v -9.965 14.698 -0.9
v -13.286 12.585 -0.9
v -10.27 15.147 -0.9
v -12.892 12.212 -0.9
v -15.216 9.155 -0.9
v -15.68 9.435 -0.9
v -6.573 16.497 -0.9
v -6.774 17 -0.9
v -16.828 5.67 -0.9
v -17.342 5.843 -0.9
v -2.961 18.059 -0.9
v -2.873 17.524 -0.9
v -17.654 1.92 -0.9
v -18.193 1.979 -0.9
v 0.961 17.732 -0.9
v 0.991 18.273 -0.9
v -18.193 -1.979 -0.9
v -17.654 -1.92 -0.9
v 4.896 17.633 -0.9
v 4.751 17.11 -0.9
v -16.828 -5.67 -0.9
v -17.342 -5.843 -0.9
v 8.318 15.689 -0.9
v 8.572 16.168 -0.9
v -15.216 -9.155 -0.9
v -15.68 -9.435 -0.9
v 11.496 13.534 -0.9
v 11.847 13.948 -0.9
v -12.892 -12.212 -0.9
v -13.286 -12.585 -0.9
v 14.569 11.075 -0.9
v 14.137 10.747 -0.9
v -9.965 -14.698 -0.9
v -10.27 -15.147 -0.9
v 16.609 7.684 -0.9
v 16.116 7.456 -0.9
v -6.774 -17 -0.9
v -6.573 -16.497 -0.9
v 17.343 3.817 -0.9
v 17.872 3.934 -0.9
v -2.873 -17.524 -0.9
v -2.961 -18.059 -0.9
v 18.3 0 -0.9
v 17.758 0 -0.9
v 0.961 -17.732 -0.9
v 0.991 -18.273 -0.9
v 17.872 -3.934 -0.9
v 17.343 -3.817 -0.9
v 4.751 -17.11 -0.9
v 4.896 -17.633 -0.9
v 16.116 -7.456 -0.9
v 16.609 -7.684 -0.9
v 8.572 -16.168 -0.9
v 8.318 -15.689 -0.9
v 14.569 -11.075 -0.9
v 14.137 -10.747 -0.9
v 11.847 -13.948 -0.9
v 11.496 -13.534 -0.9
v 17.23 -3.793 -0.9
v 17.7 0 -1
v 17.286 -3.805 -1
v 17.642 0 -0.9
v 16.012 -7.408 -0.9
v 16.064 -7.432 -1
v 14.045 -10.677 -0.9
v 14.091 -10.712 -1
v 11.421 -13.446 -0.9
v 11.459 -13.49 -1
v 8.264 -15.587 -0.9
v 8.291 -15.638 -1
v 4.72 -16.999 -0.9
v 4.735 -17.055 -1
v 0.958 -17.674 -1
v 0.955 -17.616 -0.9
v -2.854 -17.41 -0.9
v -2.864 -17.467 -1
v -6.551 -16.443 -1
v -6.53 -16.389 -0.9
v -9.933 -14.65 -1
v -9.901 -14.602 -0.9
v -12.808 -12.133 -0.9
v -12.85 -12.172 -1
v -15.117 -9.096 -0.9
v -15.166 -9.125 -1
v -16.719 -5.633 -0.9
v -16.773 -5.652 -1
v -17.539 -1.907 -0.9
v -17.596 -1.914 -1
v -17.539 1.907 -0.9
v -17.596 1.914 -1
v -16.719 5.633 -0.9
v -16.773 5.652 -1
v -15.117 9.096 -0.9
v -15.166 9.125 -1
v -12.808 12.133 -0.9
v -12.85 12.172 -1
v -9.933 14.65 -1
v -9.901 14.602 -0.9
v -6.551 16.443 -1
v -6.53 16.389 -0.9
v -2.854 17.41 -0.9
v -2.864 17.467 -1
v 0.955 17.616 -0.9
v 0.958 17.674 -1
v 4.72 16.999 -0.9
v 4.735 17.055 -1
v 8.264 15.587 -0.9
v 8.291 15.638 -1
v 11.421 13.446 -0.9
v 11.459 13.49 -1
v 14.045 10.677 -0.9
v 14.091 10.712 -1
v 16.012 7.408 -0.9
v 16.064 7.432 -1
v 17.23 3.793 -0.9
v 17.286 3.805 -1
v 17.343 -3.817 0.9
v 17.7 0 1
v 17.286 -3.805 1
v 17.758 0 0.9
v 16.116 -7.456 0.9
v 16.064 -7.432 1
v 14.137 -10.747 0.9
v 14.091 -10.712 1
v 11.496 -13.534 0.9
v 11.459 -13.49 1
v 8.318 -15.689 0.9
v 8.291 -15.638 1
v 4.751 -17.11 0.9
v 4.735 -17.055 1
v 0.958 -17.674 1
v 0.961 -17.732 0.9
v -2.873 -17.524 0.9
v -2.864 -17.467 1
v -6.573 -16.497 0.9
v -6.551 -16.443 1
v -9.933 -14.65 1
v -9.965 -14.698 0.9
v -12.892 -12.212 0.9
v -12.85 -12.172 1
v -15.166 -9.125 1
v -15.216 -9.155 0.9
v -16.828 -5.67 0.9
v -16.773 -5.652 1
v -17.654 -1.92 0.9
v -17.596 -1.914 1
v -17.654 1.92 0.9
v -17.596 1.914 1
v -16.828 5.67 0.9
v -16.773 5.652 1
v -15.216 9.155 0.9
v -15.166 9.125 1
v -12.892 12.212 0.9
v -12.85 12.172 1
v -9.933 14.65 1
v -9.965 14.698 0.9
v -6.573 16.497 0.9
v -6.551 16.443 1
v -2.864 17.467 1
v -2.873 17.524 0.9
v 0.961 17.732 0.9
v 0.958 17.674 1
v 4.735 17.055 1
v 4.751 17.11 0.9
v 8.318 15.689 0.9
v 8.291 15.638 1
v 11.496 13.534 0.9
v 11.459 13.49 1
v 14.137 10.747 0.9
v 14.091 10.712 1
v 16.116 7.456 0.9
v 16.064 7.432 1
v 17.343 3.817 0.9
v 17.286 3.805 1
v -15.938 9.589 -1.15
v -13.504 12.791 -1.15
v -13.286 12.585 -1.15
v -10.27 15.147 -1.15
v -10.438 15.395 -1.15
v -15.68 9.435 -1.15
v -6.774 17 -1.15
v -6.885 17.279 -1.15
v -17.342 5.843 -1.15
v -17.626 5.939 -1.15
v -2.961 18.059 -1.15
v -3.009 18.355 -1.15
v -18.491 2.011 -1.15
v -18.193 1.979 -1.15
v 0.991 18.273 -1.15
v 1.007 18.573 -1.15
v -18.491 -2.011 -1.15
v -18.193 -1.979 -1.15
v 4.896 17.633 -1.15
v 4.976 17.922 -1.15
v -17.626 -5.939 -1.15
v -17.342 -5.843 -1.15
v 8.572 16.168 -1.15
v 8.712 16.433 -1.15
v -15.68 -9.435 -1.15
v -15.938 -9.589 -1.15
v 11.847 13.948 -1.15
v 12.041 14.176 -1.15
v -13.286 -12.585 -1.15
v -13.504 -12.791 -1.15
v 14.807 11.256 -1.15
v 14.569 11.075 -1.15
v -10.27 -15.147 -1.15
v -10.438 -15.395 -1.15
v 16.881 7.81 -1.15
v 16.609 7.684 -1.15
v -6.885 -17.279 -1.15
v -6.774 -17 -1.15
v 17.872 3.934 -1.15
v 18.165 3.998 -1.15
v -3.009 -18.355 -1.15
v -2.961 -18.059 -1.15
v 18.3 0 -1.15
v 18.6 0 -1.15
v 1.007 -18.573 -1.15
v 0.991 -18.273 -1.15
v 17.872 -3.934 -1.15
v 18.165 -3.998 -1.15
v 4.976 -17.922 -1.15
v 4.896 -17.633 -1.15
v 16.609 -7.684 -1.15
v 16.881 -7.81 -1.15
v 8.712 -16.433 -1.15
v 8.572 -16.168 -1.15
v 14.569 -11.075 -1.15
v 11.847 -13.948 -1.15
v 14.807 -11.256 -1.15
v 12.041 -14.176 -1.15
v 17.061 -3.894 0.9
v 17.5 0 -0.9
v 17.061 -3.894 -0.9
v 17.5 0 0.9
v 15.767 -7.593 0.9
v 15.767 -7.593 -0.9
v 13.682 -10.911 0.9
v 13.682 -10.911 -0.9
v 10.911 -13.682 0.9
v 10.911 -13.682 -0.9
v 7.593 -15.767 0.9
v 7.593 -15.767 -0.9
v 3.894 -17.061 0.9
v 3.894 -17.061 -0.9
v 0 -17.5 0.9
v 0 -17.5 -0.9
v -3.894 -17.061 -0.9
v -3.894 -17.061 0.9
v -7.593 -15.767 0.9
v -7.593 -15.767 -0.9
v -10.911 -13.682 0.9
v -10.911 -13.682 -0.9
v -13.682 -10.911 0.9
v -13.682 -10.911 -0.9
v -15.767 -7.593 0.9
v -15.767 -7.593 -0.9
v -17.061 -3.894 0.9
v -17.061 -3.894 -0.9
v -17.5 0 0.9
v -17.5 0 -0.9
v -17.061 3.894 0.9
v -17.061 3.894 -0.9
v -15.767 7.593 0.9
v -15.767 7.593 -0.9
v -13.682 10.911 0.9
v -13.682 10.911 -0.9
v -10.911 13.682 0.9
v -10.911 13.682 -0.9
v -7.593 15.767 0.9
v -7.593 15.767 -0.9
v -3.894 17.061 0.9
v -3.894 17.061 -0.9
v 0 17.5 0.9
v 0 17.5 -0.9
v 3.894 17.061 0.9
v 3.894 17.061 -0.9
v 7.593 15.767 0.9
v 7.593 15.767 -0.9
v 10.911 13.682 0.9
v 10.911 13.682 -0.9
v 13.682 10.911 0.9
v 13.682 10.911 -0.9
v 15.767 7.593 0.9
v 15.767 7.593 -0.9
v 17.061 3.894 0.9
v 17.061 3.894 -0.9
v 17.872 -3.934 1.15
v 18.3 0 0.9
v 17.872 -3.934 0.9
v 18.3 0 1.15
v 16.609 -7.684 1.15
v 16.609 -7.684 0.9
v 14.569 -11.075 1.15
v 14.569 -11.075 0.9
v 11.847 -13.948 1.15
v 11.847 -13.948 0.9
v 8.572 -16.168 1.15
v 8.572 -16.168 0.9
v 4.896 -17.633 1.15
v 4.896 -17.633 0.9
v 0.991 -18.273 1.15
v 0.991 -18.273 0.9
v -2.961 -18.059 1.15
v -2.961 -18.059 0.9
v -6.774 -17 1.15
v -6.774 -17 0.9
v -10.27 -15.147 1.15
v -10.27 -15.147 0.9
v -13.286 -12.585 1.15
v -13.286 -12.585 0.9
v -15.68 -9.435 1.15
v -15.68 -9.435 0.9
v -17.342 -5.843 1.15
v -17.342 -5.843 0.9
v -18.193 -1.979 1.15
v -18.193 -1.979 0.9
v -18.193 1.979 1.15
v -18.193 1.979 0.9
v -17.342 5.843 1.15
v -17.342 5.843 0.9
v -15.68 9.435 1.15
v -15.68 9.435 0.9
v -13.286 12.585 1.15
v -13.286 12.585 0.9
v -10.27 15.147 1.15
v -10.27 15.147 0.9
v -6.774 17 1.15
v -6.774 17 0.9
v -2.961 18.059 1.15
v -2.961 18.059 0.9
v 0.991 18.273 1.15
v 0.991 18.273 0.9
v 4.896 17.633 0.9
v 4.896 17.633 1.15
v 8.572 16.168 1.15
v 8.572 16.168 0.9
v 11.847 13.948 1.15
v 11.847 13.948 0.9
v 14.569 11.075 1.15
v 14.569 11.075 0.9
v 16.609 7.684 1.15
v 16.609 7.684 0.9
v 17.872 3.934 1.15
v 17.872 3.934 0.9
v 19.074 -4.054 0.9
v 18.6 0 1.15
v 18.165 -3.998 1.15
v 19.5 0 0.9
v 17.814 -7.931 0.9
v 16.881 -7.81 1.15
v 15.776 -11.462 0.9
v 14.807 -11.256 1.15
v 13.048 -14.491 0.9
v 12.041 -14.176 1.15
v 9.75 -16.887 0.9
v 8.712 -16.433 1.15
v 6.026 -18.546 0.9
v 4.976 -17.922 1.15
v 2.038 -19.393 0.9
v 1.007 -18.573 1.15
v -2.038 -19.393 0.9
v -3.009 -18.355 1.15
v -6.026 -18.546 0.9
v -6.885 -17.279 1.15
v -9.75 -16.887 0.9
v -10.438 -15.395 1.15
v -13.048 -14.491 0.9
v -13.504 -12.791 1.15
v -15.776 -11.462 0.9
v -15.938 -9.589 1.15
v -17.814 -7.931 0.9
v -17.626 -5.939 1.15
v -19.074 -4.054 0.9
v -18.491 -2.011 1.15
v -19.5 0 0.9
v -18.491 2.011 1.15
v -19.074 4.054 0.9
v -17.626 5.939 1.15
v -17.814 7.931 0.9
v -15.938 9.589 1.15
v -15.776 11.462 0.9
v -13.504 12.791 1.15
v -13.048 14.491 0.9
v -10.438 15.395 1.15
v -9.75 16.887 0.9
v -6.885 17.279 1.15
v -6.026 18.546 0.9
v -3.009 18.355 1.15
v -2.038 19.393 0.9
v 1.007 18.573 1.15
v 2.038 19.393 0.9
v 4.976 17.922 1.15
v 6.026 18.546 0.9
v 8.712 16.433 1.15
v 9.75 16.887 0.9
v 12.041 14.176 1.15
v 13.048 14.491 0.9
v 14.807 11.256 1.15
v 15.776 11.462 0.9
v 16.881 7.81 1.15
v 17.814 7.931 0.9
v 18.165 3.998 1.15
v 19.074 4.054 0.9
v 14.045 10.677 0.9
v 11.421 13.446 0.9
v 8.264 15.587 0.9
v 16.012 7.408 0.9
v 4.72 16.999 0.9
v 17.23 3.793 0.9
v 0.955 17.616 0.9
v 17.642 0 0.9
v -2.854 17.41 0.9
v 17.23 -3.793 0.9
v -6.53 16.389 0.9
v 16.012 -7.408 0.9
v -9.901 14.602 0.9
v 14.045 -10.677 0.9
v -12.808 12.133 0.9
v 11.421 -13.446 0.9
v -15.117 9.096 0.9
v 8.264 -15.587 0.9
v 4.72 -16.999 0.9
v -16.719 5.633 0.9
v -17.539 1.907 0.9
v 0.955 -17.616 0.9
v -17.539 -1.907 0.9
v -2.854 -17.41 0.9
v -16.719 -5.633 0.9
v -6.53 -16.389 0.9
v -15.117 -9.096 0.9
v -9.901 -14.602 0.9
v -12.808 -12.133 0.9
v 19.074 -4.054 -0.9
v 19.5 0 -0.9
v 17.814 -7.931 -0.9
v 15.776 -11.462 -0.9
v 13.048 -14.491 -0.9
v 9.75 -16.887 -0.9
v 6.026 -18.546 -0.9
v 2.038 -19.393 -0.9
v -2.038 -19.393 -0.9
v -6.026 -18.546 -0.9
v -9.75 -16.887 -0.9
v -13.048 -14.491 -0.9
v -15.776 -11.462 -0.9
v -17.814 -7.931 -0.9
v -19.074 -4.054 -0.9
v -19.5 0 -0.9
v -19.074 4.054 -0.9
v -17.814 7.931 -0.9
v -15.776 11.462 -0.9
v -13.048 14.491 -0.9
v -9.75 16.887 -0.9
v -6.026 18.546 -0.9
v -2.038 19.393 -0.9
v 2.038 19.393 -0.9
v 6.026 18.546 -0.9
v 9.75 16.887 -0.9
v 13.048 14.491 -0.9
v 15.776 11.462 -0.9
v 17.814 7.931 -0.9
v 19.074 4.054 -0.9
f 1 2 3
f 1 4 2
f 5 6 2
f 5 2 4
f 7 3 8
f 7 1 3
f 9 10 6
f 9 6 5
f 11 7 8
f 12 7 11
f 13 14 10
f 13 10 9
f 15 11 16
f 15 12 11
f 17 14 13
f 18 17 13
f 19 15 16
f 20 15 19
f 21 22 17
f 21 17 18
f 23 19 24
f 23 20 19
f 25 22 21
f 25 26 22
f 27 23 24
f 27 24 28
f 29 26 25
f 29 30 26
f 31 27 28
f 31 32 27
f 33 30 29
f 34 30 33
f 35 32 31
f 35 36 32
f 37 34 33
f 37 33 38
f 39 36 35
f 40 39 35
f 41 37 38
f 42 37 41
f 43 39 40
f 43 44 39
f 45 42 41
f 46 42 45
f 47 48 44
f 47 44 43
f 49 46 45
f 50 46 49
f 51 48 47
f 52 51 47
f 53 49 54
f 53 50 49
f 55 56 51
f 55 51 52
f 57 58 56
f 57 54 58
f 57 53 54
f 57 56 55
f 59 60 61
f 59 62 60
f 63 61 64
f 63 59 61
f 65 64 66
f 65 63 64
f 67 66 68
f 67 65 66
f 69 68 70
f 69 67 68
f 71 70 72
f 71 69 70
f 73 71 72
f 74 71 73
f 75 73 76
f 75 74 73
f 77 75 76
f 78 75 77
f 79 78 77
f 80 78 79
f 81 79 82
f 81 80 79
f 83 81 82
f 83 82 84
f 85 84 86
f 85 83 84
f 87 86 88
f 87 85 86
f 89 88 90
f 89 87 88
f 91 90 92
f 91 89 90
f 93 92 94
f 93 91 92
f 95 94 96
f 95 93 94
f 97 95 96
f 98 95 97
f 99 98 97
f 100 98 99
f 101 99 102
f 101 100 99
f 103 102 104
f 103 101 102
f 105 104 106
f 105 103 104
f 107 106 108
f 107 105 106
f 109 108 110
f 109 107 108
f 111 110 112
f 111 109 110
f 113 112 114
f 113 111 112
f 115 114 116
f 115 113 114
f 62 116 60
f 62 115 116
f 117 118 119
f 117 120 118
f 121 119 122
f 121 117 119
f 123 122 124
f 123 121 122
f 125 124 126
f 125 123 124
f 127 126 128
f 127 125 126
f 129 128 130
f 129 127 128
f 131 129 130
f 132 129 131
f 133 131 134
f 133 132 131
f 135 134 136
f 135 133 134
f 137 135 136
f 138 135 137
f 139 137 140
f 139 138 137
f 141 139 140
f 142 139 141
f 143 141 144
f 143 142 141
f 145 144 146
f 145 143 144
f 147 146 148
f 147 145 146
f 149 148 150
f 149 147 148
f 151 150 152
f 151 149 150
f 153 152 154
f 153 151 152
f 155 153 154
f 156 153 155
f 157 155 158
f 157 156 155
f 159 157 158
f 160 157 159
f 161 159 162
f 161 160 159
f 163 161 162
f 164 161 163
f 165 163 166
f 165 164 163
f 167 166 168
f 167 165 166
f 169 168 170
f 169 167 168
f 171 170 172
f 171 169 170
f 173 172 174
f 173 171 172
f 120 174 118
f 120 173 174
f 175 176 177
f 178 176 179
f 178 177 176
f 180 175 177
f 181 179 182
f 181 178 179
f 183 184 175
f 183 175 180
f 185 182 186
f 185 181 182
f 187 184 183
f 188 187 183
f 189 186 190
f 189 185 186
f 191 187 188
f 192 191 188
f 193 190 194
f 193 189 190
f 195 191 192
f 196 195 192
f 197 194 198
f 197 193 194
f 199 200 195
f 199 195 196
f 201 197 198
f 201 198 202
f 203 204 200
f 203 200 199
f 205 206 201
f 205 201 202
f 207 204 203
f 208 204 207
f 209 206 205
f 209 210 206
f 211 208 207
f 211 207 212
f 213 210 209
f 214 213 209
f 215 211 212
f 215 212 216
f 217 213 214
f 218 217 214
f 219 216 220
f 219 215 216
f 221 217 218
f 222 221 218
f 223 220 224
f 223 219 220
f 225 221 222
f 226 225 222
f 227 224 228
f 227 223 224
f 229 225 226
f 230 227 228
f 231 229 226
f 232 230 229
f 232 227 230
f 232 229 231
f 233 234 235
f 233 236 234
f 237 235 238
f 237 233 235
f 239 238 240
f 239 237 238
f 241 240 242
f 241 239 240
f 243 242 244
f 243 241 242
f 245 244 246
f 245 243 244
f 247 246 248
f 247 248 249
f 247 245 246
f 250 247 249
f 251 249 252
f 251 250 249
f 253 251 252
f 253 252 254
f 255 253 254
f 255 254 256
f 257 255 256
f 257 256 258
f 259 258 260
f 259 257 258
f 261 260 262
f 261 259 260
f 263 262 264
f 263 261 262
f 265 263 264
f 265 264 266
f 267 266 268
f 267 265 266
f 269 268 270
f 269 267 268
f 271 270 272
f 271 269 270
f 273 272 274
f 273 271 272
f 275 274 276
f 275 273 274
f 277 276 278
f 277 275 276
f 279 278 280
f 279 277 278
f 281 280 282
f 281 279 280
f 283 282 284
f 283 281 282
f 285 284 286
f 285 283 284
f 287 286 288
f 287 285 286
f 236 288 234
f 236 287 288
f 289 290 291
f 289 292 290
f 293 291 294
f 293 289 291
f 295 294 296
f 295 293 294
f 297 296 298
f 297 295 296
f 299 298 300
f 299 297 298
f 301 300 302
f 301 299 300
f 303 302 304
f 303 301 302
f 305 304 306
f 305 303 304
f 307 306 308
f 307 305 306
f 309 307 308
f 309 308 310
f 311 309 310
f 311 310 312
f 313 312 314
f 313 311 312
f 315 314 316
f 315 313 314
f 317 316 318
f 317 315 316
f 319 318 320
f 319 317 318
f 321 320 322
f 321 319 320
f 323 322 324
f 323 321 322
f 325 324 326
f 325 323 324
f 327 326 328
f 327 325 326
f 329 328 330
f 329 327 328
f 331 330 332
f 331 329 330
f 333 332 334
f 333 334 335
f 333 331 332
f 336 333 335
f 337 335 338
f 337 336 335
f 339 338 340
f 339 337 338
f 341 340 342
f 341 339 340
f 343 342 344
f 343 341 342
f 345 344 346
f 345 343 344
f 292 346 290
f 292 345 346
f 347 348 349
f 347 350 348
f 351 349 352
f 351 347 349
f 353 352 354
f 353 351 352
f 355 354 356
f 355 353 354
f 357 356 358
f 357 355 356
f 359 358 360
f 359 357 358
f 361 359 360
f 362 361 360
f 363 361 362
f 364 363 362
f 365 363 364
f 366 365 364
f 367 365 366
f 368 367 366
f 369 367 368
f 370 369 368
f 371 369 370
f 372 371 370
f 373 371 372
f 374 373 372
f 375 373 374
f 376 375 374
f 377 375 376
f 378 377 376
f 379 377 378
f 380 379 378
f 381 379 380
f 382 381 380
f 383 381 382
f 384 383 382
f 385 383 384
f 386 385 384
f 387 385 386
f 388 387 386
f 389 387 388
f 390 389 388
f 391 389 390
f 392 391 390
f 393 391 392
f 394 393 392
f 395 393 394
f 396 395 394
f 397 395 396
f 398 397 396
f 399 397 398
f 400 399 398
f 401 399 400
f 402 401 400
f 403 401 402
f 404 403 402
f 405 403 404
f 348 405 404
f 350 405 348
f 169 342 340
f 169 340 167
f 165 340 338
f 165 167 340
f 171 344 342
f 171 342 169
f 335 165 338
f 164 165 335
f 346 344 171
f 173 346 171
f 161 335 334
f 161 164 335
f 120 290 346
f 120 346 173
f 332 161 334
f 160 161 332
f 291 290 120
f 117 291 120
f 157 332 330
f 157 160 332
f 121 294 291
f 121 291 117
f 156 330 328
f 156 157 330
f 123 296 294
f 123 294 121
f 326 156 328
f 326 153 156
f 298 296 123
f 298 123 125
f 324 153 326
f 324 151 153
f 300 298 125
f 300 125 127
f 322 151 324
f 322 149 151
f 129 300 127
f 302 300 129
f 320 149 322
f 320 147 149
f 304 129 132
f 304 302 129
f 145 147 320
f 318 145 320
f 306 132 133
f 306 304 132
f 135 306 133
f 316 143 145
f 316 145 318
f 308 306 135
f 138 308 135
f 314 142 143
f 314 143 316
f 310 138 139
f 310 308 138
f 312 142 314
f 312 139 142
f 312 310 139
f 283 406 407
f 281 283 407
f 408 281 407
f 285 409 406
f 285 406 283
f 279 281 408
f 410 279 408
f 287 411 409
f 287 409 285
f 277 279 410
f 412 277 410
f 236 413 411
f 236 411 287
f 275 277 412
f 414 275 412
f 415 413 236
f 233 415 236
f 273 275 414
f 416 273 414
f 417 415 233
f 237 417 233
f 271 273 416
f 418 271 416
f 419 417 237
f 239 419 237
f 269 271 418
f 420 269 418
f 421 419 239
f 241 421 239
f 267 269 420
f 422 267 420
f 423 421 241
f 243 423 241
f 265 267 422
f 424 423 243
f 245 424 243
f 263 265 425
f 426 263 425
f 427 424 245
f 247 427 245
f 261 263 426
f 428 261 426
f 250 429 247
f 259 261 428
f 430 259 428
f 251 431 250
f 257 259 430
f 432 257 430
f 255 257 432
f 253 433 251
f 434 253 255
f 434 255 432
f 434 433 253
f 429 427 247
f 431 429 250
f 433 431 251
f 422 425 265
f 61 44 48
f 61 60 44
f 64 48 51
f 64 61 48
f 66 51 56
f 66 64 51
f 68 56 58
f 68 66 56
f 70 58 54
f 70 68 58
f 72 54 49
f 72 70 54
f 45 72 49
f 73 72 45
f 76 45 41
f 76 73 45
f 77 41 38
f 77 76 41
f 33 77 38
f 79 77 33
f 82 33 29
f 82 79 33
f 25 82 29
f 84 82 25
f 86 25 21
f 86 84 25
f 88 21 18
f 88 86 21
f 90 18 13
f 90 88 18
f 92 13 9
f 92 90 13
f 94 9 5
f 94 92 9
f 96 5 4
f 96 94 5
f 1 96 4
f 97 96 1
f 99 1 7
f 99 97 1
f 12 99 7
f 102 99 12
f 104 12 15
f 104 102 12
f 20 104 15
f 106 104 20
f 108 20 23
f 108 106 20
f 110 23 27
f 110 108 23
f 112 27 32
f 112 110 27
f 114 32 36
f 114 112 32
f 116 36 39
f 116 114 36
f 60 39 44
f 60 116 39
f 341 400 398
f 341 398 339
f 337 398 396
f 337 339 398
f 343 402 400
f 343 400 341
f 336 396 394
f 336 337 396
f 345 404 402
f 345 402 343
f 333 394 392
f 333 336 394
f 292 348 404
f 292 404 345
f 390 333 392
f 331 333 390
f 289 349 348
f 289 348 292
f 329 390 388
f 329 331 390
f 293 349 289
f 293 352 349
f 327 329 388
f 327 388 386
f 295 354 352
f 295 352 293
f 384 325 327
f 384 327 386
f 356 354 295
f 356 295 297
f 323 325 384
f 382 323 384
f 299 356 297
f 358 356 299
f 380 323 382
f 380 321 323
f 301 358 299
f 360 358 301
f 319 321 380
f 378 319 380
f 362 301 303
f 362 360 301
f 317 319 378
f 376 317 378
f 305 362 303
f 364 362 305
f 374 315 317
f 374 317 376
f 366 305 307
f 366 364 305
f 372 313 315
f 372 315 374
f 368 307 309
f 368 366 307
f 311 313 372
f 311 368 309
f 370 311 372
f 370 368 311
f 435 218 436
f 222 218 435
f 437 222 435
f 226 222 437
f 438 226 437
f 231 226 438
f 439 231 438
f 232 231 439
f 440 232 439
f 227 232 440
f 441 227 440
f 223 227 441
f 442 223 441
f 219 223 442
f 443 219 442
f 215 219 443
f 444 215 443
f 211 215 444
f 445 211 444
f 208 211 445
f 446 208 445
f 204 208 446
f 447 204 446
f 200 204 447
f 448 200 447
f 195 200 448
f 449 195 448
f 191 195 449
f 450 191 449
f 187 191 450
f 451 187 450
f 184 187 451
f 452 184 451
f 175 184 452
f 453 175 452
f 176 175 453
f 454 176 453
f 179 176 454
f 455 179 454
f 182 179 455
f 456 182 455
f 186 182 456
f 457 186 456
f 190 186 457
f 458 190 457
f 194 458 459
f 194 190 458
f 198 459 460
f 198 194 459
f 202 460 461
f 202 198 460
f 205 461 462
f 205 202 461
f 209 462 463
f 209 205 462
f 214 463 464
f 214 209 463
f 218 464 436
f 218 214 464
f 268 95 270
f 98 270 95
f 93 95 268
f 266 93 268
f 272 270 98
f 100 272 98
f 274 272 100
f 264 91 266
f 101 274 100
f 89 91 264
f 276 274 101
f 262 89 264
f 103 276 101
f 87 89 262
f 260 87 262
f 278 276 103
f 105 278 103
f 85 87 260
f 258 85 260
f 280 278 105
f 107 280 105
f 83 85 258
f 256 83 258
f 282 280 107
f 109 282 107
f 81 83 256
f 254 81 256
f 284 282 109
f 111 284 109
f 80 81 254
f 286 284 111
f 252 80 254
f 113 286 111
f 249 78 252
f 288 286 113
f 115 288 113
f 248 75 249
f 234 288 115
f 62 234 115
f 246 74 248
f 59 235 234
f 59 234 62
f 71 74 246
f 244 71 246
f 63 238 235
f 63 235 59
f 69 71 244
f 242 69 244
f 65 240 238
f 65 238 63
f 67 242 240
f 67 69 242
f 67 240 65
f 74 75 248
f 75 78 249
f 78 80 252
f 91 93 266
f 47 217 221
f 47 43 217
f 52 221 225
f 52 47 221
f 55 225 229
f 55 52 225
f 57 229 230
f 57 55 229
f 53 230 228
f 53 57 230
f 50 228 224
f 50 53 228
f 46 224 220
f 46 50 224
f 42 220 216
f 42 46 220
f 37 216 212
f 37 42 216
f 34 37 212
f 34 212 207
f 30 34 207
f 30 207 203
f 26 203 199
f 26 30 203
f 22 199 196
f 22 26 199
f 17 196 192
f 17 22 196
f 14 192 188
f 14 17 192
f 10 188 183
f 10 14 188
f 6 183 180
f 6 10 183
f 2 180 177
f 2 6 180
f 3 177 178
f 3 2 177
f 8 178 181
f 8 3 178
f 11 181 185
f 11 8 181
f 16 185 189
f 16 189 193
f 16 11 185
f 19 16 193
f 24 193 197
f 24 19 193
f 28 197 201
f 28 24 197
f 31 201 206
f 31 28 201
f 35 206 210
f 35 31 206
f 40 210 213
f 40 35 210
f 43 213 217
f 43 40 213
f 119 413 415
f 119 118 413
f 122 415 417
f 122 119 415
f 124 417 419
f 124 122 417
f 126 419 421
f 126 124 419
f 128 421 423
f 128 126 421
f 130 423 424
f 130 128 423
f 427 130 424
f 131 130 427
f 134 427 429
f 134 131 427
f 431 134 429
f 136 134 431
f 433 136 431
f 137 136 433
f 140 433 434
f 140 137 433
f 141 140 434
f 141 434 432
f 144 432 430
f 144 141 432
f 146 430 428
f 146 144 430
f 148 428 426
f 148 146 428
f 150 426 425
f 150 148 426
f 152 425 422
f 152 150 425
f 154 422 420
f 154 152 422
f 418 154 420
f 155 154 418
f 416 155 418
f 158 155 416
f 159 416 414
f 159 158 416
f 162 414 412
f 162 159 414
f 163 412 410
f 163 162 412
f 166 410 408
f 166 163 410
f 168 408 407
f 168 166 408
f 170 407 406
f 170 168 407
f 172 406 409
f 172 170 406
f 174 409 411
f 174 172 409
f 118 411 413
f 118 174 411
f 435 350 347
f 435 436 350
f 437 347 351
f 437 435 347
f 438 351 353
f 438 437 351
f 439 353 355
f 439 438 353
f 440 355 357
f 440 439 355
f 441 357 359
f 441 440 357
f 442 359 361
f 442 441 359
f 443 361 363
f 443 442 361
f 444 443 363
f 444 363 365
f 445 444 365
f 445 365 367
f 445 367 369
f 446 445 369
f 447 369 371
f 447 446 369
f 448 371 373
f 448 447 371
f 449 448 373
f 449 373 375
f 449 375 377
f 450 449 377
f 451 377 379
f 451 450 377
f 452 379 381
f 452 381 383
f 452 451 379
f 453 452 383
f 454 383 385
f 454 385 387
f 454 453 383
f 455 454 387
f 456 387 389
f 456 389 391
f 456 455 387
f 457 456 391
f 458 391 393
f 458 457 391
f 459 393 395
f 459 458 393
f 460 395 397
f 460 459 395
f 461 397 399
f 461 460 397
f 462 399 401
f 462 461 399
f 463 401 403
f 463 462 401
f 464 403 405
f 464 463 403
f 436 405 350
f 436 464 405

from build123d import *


with BuildPart() as part:
    # Sketch2 → Revolve2 (revolve)
    with BuildSketch(Plane(origin=(0, 0, 0), x_dir=(0, 0, -1), z_dir=(1, 0, 0))):
        Polygon((-0.9, 19.5), (0.9, 19.5), (1.15, 18.6), (1.15, 18.3), (0.9, 18.3), (0.9, 17.757735027), (1, 17.7), (0.9, 17.642264973), (0.9, 17.5), (-0.9, 17.5), (-0.9, 17.642264973), (-1, 17.7), (-0.9, 17.757735027), (-0.9, 18.3), (-1.15, 18.3), (-1.15, 18.6), align=None)
    revolve(axis=Axis((0, 0, 0), (0, 0, -1)))


solid = part.part
